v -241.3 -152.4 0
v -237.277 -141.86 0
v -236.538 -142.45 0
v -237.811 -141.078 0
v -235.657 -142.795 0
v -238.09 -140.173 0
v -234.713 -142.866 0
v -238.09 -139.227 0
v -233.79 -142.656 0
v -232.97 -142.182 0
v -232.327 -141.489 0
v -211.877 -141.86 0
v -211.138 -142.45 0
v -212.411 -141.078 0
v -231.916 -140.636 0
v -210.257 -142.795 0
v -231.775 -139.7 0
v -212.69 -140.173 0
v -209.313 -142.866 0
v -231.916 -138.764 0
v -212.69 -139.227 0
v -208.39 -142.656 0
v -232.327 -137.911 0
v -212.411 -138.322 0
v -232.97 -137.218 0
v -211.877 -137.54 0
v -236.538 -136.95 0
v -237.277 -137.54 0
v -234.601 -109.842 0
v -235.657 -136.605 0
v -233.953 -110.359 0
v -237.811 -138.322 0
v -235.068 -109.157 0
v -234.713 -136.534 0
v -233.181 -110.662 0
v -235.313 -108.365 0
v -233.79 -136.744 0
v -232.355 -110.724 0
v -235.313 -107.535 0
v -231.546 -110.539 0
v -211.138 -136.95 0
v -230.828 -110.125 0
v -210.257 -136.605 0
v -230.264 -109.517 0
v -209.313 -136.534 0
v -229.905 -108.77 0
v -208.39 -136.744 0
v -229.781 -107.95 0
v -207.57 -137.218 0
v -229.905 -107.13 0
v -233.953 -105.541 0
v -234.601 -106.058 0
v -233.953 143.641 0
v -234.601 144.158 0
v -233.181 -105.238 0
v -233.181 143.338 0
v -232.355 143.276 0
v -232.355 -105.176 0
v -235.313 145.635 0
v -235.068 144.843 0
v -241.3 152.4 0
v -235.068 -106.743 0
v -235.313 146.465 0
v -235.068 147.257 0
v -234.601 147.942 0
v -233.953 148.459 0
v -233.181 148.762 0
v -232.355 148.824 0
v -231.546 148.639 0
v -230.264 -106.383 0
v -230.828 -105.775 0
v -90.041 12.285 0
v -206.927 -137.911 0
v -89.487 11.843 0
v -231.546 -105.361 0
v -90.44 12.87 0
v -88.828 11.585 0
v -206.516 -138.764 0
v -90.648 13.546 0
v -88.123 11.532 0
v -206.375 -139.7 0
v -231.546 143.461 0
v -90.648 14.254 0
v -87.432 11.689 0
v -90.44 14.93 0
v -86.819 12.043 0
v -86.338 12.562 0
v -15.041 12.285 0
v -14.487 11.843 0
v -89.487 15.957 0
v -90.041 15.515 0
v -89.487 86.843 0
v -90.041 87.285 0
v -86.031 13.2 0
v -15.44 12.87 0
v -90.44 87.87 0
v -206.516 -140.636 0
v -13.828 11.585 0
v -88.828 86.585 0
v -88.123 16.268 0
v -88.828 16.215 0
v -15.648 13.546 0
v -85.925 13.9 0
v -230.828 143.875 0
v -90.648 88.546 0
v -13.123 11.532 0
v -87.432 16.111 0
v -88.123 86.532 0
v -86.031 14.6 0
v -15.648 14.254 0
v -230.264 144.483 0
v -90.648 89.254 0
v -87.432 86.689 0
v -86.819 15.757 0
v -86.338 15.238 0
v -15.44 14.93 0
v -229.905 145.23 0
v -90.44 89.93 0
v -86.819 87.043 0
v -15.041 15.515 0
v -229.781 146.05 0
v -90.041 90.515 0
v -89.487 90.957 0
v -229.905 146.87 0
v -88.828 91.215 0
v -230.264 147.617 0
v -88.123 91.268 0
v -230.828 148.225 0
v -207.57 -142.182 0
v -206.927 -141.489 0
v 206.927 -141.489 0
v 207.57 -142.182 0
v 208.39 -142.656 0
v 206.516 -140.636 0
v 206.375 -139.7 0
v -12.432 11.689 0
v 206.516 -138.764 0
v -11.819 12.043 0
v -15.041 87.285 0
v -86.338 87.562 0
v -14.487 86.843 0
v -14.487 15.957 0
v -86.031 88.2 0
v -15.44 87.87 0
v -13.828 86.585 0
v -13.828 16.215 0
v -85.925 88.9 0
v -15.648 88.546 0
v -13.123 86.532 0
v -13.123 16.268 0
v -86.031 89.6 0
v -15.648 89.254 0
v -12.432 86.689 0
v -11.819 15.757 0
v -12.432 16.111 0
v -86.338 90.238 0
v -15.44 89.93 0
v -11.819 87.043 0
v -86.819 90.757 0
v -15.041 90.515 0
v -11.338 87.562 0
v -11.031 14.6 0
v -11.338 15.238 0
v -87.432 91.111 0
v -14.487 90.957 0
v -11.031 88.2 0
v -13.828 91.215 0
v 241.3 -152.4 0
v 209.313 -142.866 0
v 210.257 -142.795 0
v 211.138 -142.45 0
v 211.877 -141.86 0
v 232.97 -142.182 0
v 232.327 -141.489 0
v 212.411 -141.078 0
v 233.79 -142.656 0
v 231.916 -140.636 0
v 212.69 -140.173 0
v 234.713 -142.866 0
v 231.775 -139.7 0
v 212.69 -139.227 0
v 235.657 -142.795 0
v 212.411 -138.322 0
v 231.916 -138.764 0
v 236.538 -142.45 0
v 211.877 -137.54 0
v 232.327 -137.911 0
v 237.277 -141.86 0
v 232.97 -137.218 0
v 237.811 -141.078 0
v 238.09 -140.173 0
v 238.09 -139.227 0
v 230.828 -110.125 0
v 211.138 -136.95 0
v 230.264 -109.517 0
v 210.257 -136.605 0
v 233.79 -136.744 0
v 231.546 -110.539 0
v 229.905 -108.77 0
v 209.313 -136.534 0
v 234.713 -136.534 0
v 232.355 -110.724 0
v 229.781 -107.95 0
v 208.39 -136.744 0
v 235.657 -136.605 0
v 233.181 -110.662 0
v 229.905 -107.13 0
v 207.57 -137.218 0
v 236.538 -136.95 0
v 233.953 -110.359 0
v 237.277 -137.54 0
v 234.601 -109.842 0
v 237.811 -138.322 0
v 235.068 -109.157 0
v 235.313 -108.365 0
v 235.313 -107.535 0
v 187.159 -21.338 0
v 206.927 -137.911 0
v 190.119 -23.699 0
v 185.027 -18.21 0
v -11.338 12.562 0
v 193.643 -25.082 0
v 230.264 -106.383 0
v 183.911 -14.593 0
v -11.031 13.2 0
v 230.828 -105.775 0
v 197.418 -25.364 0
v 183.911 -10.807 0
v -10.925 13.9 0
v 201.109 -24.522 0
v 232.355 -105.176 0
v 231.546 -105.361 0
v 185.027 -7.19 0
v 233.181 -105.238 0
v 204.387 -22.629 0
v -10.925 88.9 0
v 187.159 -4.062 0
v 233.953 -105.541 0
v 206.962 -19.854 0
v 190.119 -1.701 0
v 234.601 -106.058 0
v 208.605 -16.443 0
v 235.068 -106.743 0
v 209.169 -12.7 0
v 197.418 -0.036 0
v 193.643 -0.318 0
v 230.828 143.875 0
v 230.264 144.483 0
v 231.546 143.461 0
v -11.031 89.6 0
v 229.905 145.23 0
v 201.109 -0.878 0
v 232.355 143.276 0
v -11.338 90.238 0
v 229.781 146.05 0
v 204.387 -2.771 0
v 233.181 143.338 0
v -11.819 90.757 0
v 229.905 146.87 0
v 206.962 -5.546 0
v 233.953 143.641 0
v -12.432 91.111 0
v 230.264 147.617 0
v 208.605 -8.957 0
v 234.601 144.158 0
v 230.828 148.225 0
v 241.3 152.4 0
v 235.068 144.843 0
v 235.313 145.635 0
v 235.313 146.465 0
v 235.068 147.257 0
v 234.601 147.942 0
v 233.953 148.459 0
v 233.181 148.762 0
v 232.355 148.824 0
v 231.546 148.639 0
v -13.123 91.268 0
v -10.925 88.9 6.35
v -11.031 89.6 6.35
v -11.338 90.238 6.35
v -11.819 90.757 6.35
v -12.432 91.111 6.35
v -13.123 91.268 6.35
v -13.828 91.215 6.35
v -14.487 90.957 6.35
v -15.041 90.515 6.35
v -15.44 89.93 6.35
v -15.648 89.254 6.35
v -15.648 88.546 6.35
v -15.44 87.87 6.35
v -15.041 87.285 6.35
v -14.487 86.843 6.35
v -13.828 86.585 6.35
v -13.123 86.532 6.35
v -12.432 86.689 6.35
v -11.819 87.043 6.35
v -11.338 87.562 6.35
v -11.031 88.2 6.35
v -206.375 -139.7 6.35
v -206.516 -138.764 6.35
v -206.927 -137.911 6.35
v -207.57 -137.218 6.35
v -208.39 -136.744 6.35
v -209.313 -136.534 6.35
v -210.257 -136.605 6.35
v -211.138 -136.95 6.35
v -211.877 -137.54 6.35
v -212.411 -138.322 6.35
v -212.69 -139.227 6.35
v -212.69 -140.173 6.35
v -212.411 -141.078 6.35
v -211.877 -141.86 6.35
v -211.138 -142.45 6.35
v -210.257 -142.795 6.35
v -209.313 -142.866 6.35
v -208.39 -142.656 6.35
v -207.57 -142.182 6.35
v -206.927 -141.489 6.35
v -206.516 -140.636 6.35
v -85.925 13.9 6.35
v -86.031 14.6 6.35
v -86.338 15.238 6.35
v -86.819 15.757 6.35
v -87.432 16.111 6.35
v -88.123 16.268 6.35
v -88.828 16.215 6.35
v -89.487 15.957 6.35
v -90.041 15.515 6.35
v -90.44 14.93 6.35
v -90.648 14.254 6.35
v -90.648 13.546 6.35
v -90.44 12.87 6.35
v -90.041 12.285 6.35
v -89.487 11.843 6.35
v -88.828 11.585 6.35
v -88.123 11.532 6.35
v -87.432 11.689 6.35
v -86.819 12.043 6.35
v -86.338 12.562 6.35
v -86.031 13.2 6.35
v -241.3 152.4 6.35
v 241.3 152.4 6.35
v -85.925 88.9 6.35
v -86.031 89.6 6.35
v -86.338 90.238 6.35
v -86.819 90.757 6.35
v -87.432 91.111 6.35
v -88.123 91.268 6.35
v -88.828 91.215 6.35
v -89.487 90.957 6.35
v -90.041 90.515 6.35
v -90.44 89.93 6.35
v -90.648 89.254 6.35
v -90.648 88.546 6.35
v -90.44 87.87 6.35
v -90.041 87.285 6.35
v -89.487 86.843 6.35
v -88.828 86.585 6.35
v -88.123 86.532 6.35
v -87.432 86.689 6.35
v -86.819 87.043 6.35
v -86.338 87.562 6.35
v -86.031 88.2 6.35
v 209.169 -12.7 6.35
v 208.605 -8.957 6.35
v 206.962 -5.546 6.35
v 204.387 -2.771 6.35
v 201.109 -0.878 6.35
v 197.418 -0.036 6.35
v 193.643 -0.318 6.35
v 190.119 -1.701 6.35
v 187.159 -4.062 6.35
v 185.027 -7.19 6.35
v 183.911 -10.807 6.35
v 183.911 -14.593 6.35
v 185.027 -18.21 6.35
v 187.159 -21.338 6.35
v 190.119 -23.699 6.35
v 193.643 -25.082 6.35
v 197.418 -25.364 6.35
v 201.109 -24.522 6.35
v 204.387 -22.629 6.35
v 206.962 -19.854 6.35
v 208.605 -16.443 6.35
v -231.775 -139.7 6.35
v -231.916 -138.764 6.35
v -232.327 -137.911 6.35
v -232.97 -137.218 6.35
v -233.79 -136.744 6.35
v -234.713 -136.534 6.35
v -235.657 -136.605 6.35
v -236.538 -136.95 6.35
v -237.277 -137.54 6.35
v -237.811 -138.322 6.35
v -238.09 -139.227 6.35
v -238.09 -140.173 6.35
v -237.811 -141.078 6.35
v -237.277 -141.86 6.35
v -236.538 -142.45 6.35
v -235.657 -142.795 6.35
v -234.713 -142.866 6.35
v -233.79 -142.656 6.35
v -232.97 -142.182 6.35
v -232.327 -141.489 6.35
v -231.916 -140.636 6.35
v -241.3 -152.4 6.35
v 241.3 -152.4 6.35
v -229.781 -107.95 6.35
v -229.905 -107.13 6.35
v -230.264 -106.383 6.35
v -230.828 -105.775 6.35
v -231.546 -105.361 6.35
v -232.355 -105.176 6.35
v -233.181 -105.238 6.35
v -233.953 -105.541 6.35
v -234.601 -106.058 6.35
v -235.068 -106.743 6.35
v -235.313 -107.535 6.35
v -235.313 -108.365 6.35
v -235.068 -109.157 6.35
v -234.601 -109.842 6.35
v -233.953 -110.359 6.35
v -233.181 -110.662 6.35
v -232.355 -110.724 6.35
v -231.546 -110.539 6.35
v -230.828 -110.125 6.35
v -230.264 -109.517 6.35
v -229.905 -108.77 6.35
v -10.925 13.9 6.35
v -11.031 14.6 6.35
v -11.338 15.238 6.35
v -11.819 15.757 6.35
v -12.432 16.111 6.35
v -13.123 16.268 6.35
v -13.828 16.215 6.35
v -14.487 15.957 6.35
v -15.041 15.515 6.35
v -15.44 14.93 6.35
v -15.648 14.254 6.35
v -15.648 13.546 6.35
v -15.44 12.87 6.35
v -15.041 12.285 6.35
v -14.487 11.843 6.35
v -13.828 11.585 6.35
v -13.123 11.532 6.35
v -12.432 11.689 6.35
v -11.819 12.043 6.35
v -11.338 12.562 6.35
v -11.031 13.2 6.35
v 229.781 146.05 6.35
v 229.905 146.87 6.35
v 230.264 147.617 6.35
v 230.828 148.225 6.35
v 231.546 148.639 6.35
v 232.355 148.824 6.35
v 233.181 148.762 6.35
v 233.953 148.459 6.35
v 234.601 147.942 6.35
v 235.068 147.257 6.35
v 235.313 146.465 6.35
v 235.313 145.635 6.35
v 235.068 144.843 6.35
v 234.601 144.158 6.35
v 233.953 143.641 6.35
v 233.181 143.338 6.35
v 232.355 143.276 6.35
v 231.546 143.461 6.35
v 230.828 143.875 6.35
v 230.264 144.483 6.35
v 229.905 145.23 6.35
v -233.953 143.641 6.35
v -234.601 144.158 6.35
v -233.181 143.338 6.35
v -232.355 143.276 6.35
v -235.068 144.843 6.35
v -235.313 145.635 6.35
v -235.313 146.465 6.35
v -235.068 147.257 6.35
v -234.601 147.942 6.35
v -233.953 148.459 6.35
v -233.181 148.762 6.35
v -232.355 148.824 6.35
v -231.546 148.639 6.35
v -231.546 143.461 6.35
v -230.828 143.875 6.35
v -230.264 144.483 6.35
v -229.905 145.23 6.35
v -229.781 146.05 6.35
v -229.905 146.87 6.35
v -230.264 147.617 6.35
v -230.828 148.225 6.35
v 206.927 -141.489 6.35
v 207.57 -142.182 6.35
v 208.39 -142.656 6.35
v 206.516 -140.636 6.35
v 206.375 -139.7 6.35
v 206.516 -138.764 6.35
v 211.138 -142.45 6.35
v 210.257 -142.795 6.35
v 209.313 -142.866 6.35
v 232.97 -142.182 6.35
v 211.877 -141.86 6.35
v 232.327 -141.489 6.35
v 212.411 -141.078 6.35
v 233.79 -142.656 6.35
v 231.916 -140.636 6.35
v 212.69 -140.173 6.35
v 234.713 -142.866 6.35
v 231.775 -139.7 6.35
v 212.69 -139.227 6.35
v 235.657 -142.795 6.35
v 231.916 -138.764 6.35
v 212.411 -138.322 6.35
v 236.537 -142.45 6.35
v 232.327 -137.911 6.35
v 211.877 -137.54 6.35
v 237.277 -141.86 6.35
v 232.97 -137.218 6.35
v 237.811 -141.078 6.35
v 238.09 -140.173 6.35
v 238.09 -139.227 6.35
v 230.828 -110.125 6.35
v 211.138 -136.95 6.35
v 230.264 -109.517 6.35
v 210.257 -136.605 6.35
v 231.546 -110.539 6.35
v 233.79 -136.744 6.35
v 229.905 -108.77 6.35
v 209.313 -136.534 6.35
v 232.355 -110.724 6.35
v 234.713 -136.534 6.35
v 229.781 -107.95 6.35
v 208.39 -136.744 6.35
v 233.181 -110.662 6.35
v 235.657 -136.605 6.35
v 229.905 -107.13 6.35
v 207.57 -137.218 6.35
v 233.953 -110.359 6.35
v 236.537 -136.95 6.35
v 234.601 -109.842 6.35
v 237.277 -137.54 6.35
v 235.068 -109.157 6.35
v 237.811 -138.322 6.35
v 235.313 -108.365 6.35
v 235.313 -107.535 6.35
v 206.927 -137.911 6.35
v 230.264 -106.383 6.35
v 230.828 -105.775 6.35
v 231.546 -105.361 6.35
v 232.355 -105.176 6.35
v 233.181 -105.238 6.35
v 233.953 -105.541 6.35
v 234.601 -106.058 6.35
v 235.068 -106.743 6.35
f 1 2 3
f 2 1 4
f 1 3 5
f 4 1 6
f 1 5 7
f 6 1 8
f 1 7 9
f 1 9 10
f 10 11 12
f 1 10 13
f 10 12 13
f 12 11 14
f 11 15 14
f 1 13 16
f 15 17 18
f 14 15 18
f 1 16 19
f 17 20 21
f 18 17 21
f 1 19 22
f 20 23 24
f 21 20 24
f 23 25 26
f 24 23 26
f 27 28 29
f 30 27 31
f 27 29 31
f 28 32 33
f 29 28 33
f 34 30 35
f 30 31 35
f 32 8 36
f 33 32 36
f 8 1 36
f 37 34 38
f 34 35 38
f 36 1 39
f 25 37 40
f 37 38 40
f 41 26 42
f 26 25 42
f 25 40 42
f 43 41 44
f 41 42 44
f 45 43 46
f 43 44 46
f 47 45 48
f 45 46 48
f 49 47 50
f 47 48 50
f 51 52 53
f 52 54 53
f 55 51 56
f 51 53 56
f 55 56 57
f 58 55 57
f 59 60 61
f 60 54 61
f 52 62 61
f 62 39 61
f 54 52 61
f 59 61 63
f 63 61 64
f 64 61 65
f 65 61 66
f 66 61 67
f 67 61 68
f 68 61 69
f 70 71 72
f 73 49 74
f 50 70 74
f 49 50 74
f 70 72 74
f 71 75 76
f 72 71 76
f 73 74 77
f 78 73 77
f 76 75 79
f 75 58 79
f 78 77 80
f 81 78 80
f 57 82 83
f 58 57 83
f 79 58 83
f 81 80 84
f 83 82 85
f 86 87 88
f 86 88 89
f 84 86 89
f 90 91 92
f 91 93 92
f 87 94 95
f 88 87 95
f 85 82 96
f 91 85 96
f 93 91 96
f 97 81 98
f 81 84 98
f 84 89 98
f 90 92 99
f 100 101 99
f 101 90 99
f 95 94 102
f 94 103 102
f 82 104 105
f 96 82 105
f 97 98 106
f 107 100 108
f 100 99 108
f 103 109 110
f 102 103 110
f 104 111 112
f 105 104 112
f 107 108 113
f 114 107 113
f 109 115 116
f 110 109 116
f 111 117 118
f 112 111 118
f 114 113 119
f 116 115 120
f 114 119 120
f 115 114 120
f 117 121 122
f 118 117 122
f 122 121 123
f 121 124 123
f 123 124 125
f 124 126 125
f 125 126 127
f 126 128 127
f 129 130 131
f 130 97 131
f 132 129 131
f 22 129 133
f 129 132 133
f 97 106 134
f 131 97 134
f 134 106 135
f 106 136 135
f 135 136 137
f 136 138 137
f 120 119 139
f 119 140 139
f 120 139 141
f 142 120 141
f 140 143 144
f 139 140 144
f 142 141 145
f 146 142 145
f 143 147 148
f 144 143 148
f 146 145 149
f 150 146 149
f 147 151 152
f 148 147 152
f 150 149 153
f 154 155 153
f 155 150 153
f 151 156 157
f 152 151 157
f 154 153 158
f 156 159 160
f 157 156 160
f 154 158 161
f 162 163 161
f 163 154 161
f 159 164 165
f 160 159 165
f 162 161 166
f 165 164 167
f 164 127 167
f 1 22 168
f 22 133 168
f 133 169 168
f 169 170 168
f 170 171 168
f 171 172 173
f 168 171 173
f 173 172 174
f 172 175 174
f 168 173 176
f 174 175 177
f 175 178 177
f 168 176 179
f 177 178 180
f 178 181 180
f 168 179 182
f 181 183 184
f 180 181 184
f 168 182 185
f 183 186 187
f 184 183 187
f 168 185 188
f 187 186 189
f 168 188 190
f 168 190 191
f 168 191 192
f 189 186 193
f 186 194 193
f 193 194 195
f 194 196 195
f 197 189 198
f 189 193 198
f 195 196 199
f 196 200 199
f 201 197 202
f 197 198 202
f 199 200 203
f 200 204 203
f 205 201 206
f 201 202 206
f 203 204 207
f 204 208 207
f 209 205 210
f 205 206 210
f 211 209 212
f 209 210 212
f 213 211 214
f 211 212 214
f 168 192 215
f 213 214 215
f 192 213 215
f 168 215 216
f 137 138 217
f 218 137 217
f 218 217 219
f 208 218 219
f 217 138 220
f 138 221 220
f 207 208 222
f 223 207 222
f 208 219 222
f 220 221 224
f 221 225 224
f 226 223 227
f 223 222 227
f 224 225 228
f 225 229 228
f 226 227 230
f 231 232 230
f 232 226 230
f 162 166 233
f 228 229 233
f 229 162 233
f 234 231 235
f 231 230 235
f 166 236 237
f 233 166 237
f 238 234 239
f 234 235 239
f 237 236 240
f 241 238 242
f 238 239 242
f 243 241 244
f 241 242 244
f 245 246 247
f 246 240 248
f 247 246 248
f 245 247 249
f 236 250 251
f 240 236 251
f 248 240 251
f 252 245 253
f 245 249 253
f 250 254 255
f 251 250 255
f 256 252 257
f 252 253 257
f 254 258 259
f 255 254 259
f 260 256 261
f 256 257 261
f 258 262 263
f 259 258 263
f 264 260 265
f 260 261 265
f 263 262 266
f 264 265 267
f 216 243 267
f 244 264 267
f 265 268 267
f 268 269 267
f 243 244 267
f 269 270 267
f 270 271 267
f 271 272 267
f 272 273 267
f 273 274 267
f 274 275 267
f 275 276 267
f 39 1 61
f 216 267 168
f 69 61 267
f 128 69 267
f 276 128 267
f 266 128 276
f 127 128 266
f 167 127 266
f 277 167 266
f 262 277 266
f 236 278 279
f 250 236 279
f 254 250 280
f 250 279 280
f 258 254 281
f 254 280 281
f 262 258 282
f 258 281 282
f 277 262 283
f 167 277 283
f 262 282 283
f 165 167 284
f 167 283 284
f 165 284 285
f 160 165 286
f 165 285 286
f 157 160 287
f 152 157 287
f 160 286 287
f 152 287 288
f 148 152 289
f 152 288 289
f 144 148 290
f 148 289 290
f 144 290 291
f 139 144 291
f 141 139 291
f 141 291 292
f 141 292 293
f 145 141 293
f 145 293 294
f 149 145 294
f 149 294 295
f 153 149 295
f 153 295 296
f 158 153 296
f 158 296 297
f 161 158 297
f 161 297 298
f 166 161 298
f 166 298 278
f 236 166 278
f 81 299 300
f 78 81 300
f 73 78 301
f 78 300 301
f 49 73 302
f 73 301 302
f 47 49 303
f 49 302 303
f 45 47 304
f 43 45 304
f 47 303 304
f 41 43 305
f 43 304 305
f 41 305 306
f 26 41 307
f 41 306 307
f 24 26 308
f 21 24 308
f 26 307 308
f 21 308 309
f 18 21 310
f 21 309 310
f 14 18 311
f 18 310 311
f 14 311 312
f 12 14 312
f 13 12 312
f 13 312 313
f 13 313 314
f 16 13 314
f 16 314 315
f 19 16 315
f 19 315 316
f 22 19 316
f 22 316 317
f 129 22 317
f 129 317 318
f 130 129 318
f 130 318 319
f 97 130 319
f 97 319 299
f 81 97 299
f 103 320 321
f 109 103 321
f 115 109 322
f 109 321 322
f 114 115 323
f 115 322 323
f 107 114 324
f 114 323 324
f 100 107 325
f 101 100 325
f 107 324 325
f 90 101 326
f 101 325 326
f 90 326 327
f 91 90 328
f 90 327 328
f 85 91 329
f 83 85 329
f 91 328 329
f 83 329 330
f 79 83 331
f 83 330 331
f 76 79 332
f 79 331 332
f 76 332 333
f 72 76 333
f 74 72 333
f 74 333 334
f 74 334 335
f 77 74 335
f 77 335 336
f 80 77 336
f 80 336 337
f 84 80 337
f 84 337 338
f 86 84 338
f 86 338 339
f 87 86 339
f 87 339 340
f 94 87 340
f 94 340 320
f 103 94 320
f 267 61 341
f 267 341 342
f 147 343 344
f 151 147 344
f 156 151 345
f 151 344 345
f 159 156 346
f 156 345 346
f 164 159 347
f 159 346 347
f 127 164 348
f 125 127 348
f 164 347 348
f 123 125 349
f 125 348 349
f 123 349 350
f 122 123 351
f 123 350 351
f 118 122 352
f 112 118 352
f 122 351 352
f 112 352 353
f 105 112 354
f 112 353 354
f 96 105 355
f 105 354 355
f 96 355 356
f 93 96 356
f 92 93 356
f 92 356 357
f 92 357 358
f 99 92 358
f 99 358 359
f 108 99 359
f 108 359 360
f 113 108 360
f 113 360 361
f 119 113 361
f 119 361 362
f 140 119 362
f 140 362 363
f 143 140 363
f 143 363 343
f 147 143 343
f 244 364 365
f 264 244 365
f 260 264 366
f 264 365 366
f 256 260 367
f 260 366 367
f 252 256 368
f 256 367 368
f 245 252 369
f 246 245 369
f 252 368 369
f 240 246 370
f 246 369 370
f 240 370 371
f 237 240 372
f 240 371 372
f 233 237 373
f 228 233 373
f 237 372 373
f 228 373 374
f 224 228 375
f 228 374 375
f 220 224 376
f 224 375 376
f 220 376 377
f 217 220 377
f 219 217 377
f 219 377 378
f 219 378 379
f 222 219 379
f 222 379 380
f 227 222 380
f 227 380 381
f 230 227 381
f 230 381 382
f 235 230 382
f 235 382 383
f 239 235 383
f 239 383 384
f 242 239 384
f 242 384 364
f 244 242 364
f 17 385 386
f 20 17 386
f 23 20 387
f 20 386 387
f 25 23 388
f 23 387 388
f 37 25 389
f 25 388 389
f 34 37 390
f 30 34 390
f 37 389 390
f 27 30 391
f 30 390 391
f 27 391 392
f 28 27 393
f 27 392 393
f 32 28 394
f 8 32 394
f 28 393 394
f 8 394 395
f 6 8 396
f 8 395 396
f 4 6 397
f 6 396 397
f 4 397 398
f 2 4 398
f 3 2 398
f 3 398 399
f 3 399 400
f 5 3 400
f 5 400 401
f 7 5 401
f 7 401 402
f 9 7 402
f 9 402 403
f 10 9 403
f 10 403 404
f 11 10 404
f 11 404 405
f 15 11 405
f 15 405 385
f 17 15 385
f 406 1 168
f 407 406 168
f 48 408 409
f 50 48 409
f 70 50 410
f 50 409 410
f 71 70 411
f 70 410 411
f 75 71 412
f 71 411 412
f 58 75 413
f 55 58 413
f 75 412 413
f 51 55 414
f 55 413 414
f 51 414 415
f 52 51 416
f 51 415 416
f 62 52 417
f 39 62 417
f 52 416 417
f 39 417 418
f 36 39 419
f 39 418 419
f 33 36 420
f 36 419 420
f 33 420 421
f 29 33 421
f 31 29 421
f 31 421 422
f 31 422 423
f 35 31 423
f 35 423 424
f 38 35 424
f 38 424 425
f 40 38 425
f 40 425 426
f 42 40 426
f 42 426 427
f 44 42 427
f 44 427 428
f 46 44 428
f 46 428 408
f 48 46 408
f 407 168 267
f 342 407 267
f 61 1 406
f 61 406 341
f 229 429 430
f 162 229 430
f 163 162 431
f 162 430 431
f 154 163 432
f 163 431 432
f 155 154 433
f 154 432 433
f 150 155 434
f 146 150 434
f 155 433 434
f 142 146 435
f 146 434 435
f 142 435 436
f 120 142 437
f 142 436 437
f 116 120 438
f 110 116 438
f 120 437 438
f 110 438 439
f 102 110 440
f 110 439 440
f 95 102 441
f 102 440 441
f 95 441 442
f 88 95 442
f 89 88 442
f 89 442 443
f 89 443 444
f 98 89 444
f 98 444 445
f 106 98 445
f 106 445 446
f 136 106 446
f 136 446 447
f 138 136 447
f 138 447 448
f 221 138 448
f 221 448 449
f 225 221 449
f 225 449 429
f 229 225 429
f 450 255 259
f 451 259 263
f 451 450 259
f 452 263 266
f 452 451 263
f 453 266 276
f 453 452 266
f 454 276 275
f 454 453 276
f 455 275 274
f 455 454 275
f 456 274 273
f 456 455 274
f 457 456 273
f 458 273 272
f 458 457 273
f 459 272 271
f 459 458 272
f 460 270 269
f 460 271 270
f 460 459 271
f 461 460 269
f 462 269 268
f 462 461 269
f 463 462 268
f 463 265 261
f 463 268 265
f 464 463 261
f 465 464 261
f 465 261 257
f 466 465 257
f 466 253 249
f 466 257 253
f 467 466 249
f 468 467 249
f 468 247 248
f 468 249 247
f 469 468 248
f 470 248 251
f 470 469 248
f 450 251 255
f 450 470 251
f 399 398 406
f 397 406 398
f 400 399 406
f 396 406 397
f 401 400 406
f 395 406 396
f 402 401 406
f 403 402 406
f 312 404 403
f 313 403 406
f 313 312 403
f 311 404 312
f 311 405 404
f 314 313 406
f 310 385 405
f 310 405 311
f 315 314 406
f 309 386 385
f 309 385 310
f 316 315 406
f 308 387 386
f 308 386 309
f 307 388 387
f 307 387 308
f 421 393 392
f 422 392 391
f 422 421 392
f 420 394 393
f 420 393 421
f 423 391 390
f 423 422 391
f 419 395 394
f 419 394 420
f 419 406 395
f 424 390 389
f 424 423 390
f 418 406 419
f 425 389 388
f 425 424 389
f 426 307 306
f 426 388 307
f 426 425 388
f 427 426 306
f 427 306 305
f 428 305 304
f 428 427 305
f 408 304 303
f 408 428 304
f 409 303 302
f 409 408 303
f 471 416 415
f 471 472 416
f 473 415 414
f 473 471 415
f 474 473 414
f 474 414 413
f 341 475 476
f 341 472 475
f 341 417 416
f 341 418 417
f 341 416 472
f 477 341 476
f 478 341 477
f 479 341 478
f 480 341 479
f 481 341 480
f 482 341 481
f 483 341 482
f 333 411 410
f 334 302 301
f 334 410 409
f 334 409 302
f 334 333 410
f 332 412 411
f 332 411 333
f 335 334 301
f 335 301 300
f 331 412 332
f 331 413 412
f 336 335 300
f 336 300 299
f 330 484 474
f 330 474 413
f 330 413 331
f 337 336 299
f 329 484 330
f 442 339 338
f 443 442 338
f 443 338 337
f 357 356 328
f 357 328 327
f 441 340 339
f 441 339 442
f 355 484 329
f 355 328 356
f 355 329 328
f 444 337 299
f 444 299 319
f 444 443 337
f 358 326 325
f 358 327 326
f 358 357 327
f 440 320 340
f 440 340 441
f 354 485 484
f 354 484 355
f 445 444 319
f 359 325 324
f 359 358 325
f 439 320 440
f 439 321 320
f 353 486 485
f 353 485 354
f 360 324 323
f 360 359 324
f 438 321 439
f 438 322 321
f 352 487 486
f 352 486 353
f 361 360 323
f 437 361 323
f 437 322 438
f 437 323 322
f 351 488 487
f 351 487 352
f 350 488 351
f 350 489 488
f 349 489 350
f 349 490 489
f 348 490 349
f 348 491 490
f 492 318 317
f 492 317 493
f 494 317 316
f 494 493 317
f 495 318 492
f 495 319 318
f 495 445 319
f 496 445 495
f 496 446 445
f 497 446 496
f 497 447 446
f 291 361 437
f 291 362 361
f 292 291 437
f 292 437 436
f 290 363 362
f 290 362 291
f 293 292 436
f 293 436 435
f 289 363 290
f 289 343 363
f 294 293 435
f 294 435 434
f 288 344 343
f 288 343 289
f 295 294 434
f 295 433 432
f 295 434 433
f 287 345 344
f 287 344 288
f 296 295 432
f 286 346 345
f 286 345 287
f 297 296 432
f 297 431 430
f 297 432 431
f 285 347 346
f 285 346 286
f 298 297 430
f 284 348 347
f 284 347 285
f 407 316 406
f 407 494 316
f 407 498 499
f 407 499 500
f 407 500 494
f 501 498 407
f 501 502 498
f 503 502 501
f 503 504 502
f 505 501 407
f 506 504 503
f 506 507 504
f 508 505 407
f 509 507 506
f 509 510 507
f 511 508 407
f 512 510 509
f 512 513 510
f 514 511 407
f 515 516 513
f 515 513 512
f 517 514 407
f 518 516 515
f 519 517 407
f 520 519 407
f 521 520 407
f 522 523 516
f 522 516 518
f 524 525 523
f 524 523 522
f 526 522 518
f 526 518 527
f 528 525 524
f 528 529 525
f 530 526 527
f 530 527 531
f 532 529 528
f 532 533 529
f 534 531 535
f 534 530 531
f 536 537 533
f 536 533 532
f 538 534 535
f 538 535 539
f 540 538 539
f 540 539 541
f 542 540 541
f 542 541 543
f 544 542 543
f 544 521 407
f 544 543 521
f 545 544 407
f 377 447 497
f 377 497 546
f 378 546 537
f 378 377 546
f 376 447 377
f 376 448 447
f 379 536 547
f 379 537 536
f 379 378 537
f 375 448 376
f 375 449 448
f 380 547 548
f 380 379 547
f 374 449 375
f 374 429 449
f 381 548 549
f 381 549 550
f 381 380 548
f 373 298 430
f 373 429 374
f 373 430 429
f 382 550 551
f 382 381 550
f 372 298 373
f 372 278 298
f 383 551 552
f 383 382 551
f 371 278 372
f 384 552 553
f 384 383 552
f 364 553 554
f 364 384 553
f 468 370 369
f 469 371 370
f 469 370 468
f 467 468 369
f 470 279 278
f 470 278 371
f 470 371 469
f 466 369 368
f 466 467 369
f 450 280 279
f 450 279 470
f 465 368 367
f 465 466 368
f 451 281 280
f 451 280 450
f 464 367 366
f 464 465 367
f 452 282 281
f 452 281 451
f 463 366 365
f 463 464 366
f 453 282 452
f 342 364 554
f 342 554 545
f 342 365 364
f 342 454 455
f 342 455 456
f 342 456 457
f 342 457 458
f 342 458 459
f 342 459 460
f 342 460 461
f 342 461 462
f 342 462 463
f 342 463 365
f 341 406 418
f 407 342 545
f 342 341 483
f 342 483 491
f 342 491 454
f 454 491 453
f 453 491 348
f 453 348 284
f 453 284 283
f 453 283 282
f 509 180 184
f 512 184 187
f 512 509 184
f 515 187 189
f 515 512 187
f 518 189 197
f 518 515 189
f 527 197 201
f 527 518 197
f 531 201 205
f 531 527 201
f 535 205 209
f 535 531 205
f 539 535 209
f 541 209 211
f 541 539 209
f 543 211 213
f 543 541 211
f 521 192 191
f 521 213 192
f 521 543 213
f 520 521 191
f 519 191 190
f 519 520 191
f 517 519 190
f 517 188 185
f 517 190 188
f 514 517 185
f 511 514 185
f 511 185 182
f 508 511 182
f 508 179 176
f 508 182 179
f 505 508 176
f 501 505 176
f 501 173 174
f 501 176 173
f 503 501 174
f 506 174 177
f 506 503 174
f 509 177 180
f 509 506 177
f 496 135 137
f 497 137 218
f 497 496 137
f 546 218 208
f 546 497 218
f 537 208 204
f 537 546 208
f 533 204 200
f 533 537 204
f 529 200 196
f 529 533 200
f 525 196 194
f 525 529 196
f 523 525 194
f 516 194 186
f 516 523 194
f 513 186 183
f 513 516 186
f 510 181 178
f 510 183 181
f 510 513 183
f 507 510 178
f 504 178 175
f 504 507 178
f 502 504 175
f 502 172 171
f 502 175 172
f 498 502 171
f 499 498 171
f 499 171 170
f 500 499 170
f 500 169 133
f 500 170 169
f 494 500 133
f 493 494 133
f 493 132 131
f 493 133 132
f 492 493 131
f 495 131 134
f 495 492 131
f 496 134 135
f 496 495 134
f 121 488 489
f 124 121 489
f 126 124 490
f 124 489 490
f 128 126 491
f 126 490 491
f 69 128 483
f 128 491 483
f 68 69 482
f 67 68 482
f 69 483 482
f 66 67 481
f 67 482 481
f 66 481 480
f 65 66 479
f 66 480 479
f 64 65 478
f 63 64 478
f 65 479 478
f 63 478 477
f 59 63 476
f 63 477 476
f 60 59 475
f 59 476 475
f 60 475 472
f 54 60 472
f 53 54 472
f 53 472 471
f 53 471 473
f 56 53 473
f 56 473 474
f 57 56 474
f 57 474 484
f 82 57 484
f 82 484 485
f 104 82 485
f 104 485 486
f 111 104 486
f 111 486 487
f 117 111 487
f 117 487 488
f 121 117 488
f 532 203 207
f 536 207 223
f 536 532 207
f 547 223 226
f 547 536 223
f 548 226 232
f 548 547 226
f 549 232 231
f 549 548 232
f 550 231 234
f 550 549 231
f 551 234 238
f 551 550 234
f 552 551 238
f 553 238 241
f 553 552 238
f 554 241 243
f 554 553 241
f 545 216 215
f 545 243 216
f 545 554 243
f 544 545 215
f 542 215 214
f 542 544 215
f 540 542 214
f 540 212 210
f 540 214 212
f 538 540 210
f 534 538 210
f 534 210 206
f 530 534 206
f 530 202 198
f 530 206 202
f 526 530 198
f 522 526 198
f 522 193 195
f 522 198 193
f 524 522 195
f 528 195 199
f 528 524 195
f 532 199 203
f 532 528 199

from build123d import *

# Parameters (mm, degrees)
SKETCH1_W           = 482.6
SKETCH1_H           = 304.8
BOSS_EXTRUDE1_DEPTH = 6.35
SKETCH2_R           = 2.7813
CUT_EXTRUDE1_DEPTH  = 286.467638271
SKETCH3_R           = 3.175
CUT_EXTRUDE2_DEPTH  = 286.467638271
SKETCH4_R           = 12.7
CUT_EXTRUDE3_DEPTH  = 286.467638271
SKETCH5_R           = 2.3749
CUT_EXTRUDE4_DEPTH  = 286.467638271


with BuildPart() as part:
    # Sketch1 → Boss-Extrude1 (new body)
    with BuildSketch(Plane.XY):
        Rectangle(SKETCH1_W, SKETCH1_H)
    extrude(amount=BOSS_EXTRUDE1_DEPTH)

    # Sketch2 → Cut-Extrude1 (cut, through all)
    with BuildSketch(Plane.XY.offset(6.35)):
        with Locations((-232.5624, 146.05)):
            Circle(SKETCH2_R)
        with Locations((-232.5624, -107.95)):
            Circle(SKETCH2_R)
    cut_extrude1 = extrude(amount=-CUT_EXTRUDE1_DEPTH, mode=Mode.SUBTRACT)

    # Mirror1: Cut-Extrude1 across plane
    add(cut_extrude1.mirror(Plane(origin=(0, 0, 0), x_dir=(0, 0, 1), z_dir=(1, 0, 0))), mode=Mode.SUBTRACT)

    # Sketch3 → Cut-Extrude2 (cut, through all)
    with BuildSketch(Plane.XY.offset(6.35)):
        with Locations((-234.95, -139.7)):
            Circle(SKETCH3_R)
        with Locations((-209.55, -139.7)):
            Circle(SKETCH3_R)
    cut_extrude2 = extrude(amount=-CUT_EXTRUDE2_DEPTH, mode=Mode.SUBTRACT)

    # Mirror2: Cut-Extrude2 across plane
    add(cut_extrude2.mirror(Plane(origin=(0, 0, 0), x_dir=(0, 0, 1), z_dir=(1, 0, 0))), mode=Mode.SUBTRACT)

    # Sketch4 → Cut-Extrude3 (cut, through all)
    with BuildSketch(Plane.XY.offset(6.35)):
        with Locations((196.469, -12.7)):
            Circle(SKETCH4_R)
    extrude(amount=-CUT_EXTRUDE3_DEPTH, mode=Mode.SUBTRACT)

    # Sketch5 → Cut-Extrude4 (cut, through all)
    with BuildSketch(Plane.XY.offset(6.35)):
        with Locations((-88.3, 88.9)):
            Circle(SKETCH5_R)
        with Locations((-13.3, 88.9)):
            Circle(SKETCH5_R)
        with Locations((-13.3, 13.9)):
            Circle(SKETCH5_R)
        with Locations((-88.3, 13.9)):
            Circle(SKETCH5_R)
    extrude(amount=-CUT_EXTRUDE4_DEPTH, mode=Mode.SUBTRACT)


solid = part.part
